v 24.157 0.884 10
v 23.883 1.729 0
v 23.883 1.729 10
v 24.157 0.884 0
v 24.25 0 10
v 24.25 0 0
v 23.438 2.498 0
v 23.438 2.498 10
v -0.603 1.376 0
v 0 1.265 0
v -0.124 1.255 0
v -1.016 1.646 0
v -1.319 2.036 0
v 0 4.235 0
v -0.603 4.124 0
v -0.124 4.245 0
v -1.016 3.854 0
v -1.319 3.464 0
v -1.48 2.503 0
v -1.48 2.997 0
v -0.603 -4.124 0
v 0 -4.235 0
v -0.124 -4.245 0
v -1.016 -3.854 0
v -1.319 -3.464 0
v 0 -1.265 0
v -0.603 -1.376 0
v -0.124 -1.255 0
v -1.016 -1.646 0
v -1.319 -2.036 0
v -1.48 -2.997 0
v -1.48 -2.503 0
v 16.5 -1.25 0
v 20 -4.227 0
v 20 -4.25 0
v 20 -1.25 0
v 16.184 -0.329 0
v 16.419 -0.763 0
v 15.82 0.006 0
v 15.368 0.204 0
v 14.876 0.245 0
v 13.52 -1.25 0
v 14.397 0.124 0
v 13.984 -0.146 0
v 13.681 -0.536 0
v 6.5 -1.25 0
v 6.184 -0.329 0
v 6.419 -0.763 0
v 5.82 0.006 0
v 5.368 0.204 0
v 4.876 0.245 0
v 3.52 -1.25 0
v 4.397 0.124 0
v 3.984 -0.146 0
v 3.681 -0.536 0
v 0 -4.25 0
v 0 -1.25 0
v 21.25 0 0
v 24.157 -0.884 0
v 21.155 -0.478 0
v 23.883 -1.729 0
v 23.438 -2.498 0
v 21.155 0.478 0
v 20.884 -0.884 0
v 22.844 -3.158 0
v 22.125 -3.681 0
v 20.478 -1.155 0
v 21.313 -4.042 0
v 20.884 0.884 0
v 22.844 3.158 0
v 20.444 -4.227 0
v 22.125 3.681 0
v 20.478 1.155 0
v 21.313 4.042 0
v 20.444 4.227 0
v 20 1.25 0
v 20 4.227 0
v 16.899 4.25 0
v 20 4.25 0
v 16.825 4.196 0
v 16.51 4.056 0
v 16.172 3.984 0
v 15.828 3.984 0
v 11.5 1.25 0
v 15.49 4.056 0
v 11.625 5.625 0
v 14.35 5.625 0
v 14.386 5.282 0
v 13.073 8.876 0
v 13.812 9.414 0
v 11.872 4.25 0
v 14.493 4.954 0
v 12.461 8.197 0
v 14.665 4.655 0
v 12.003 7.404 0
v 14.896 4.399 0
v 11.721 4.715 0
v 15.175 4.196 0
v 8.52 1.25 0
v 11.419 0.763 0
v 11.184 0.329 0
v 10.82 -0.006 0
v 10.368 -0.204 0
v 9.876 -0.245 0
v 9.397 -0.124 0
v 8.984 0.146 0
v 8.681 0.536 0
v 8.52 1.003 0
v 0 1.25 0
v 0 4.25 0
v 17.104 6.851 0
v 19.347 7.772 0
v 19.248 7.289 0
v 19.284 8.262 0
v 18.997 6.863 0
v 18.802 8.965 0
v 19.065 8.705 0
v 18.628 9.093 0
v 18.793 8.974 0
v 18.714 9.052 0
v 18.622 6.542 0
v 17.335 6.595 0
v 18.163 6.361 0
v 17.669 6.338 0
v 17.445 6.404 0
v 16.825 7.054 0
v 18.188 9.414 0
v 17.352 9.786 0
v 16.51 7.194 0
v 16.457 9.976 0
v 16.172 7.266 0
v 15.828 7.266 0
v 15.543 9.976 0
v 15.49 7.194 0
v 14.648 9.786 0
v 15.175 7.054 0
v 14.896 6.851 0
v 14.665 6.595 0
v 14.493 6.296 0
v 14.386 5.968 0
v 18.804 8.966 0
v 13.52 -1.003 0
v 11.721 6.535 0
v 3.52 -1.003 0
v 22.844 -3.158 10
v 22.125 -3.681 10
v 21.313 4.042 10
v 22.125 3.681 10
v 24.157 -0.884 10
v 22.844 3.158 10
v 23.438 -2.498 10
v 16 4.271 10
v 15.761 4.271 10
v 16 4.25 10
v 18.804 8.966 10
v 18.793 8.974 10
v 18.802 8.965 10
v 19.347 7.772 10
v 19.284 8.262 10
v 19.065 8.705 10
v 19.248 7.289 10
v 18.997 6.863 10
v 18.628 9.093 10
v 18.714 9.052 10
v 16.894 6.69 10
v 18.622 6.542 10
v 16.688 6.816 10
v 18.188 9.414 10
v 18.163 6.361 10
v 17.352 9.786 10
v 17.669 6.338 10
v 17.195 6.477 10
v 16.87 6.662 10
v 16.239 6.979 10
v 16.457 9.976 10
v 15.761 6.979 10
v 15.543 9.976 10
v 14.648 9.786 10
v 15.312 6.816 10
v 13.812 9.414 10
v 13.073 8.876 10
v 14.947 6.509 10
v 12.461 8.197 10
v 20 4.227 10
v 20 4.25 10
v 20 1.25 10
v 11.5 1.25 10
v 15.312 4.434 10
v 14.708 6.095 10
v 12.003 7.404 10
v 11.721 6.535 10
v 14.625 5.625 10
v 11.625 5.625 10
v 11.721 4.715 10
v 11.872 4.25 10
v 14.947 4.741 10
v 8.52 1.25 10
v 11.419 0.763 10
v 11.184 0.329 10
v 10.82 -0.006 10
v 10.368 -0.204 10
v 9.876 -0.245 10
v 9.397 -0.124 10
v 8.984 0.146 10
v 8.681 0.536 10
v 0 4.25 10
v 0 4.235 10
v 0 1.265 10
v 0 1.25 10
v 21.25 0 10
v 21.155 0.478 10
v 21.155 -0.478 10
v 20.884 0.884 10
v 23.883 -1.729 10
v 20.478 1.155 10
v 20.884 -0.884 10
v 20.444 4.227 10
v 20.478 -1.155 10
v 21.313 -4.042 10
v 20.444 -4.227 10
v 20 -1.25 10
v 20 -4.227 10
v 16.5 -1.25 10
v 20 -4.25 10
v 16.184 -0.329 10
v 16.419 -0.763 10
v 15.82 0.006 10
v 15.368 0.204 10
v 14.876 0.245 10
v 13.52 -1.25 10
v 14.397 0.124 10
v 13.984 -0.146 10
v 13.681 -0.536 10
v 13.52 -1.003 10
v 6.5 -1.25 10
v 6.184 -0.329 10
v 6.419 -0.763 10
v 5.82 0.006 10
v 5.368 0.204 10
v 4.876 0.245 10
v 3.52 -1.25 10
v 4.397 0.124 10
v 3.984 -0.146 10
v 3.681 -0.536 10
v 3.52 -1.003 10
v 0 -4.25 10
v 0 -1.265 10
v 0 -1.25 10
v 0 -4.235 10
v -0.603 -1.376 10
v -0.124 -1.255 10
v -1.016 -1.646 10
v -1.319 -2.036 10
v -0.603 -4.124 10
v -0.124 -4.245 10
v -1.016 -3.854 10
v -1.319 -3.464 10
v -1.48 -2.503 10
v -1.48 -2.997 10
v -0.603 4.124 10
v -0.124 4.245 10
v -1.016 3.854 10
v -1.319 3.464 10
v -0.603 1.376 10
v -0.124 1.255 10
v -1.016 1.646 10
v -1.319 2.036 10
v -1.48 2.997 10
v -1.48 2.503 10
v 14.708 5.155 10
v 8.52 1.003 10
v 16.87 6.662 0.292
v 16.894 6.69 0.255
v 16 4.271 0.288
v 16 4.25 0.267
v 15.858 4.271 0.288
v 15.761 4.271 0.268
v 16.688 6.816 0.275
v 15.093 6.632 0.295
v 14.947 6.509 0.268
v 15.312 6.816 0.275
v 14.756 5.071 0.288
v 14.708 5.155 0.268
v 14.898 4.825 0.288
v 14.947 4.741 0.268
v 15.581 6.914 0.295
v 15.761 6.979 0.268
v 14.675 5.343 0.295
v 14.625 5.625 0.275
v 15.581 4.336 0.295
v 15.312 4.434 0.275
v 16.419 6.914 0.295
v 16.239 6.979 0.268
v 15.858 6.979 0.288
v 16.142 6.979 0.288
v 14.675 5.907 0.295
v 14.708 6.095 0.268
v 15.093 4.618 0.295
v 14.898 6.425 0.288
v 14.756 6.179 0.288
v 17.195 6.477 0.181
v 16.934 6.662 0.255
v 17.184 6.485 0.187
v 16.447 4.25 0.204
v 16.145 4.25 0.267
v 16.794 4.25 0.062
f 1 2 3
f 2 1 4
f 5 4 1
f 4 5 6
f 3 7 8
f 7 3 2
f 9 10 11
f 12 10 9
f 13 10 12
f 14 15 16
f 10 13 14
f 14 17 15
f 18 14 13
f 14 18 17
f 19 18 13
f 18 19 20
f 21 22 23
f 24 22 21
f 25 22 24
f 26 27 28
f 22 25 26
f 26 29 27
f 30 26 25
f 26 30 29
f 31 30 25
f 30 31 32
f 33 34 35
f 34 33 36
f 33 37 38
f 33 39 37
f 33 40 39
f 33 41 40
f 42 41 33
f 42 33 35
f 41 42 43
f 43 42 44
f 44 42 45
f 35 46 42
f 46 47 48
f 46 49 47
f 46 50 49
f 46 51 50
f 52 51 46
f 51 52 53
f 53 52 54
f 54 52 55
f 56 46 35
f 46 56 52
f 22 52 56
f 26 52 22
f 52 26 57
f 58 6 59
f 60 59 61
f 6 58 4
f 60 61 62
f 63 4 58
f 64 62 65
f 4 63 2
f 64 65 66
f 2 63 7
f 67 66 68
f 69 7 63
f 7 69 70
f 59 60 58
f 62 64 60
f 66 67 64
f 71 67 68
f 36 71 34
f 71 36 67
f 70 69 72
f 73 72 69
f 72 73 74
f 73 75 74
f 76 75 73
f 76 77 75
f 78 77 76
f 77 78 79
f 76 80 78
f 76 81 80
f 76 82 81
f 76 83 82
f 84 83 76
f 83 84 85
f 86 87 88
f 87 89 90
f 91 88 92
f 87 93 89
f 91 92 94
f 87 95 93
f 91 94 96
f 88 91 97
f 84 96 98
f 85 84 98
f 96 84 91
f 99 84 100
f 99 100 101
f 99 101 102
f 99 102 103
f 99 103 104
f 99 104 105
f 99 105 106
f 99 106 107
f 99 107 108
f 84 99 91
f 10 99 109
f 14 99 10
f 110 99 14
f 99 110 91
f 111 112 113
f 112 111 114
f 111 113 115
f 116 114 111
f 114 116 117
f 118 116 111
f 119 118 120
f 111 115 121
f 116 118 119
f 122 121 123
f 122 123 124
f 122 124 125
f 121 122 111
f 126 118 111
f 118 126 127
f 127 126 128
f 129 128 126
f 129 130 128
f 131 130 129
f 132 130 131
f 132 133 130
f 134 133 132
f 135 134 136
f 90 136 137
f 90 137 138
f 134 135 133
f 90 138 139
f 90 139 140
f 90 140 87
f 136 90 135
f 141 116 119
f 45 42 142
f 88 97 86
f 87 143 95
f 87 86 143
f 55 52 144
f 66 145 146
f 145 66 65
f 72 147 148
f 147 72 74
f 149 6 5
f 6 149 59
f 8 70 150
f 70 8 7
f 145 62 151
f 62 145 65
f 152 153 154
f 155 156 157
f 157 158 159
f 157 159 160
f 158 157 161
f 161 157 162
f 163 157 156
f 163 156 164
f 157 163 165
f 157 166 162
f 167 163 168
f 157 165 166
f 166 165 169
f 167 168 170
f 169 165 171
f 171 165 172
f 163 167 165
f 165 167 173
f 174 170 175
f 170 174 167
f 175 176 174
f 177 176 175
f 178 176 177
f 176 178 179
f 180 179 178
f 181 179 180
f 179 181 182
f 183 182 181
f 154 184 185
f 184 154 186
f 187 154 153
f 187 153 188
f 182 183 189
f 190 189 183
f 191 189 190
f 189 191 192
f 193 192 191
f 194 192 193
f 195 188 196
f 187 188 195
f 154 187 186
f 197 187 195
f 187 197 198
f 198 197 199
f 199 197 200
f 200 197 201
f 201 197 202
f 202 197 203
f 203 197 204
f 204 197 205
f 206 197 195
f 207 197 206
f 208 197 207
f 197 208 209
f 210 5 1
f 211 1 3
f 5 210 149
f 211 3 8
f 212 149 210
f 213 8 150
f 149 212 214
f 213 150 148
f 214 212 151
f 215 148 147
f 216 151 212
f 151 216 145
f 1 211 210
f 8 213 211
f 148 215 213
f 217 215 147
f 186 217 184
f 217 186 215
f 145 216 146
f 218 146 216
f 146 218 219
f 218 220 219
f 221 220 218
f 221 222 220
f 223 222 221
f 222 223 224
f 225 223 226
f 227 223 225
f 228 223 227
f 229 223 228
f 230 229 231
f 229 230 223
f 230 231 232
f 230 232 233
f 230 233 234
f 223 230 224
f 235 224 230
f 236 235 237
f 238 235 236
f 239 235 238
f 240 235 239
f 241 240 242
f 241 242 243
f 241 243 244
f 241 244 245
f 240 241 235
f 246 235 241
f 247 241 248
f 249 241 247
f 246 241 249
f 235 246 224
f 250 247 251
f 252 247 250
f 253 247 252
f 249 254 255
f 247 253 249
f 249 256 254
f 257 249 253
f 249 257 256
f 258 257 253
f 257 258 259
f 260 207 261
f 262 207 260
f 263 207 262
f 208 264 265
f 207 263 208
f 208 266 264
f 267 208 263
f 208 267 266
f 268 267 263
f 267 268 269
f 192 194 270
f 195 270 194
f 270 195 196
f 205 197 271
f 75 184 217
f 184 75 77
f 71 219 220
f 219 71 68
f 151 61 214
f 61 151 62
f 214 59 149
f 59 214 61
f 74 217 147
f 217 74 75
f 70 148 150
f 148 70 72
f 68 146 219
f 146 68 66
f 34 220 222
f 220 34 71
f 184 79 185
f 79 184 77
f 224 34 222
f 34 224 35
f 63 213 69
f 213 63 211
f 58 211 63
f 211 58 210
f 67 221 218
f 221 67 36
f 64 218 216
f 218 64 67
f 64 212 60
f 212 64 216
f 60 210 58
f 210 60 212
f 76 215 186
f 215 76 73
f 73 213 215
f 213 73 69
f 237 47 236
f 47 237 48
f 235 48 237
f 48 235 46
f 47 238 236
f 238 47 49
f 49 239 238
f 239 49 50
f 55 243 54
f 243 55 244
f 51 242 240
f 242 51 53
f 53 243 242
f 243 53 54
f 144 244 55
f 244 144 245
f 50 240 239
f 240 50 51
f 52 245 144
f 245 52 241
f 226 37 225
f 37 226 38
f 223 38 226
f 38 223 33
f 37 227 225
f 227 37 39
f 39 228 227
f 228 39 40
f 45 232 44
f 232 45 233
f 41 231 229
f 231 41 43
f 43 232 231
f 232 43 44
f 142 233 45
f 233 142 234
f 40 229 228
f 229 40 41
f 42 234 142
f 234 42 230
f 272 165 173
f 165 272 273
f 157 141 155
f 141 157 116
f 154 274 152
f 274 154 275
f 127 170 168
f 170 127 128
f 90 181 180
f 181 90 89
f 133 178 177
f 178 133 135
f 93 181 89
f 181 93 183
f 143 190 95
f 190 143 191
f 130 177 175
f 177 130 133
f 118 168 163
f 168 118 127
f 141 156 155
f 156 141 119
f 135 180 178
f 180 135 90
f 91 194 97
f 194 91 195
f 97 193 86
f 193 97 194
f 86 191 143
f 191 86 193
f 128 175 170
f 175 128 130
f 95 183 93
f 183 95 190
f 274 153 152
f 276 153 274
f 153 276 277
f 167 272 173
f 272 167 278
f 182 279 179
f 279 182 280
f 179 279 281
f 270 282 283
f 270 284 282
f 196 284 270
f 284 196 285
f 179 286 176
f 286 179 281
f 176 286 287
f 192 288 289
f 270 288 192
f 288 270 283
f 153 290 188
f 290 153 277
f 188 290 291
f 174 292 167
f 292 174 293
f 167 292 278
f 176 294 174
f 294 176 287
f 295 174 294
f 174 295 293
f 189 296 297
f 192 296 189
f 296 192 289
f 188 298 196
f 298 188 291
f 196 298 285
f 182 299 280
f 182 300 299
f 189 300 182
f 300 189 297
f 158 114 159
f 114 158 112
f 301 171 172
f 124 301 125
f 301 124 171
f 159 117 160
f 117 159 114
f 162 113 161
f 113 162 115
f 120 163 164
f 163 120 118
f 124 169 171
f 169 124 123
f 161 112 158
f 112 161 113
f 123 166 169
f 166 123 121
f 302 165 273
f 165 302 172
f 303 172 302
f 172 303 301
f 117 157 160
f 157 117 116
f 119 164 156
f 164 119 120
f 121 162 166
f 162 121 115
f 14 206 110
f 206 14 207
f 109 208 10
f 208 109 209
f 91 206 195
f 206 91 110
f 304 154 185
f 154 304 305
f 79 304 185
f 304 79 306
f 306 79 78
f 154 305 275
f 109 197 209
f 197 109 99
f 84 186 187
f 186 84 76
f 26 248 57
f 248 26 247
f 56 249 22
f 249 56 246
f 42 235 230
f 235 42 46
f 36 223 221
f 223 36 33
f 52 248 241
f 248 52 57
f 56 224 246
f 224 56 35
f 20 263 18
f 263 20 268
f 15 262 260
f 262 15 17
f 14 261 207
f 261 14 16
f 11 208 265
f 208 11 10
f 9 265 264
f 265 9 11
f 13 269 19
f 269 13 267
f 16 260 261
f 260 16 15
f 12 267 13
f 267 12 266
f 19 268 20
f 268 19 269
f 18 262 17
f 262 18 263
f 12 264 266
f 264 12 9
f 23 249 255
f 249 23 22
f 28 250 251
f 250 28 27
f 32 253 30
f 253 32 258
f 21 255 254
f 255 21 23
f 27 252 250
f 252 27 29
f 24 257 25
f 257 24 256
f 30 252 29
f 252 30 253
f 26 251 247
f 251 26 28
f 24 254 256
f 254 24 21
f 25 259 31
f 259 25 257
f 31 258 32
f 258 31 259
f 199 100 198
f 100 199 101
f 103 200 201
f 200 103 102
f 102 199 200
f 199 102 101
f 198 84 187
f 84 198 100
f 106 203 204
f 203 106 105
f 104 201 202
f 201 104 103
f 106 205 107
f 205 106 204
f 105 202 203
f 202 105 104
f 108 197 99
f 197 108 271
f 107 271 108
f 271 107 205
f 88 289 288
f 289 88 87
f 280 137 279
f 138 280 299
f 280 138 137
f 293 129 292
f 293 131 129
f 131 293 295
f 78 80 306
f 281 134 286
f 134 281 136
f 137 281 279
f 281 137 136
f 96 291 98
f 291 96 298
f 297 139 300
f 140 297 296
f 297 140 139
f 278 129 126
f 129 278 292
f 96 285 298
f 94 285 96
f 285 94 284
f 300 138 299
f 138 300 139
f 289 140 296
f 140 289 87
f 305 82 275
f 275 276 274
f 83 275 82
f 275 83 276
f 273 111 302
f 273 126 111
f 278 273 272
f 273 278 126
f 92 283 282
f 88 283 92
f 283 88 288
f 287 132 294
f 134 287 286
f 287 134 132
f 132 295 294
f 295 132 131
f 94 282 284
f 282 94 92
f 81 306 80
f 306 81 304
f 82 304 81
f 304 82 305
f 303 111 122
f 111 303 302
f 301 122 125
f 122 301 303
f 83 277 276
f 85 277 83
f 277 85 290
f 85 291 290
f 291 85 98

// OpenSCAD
// Diameter of the cord to be wrangled, set to zero to remove the cord wrangler entirely (mm)
CordDiameter=2.75;
// Adjust the cut angle of the cord gripping portion, 30 degrees seems to be good but go nuts if you like
CordGripAngle=40; //[0:90]
// How far along on the gripper should the cord wrangler be placed?
CordGripLoc=80; //[0:100]
// Maybe you're using this as something other than just a cord gripper (as I sometimes do)
CordGripStyle=1; //[0:Closed,1:Open]

//How long should the fabric (or other substance) gripper be? (mm)
GripperLength=20;
//And how tall? (mm)
GripperHeight=10;
//And how far apart (mm)
GripperGap=2.5;

//Interior gripping knobbles, how many?
Knobbles = 2;
//Opposing knobbles on the top?
CounterKnobbles=true;//[true:Yes,false:No]

//And how thick would you like the walls of the gripper to be? (mm)
WallThickness=3;

/* [Hidden] */
CordGripLocation=CordGripLoc/100.0;
$fs=.5;

difference(){
 union(){
  translate([GripperLength,0,0])
   difference(){
    cylinder(r=GripperGap/2+WallThickness, h=GripperHeight);
    translate([-GripperGap-2*WallThickness,-GripperGap/2-WallThickness*1.5,-0.5]) cube([GripperGap+2*WallThickness,GripperGap+3*WallThickness, GripperHeight+1]);
    translate([0,0,-0.5]) cylinder(r=GripperGap/2, h=GripperHeight+1);
   }

  translate([0,GripperGap/2,0]) cube([GripperLength,WallThickness,GripperHeight]);
  translate([0,-GripperGap/2-WallThickness,0]) cube([GripperLength,WallThickness,GripperHeight]);

  translate([0,GripperGap/2+WallThickness/2,0]) cylinder(r=WallThickness/2, h=GripperHeight);
  translate([0,-GripperGap/2-WallThickness/2,0]) cylinder(r=WallThickness/2, h=GripperHeight);

  for ( i = [0:Knobbles-1] ){
   translate([(i+0.5)*GripperLength/Knobbles,-GripperGap/2,0]) cylinder(r=WallThickness/2, h=GripperHeight);
  }
  if (CounterKnobbles) 
   for ( i = [1:Knobbles-1] ){
    translate([(i)*GripperLength/Knobbles,GripperGap/2,0]) cylinder(r=WallThickness/2, h=GripperHeight);
   }

  if (CordDiameter > 0) {
   translate([GripperLength*CordGripLocation,GripperGap/2+(WallThickness+CordDiameter)/2+WallThickness/2,0]) {
   difference(){
    cylinder(r=CordDiameter/2+WallThickness, h=GripperHeight);
    translate([0,0,-0.5]) cylinder(r=CordDiameter/2, h=GripperHeight+1);
    if (CordGripStyle == 1){
     rotate([0,0,-1*abs(CordGripAngle)]) translate([0,0,-0.5]) cube([CordDiameter*2,CordDiameter*2,GripperHeight+1]);
     rotate([0,0,-90]) translate([0,0,-0.5]) cube([CordDiameter*2,CordDiameter*2,GripperHeight+1]);
    }
   }
   if (CordGripStyle == 1) rotate([0,0,-1*abs(CordGripAngle)]) translate([0,(WallThickness+CordDiameter)/2,0]) cylinder(r=WallThickness/2, h=GripperHeight);
  }
 }
}
//Put a bevel on the bottom edge of the cord grip because I don't like the "bottom layer squish" cutting into my cables.
if (CordDiameter > 0){
  translate([GripperLength*CordGripLocation,GripperGap/2+(WallThickness+CordDiameter)/2+WallThickness/2,0]) {
  translate([0,0,-CordDiameter*0.4]) cylinder(r1=CordDiameter,r2=0,h=CordDiameter);
 }
}
}
